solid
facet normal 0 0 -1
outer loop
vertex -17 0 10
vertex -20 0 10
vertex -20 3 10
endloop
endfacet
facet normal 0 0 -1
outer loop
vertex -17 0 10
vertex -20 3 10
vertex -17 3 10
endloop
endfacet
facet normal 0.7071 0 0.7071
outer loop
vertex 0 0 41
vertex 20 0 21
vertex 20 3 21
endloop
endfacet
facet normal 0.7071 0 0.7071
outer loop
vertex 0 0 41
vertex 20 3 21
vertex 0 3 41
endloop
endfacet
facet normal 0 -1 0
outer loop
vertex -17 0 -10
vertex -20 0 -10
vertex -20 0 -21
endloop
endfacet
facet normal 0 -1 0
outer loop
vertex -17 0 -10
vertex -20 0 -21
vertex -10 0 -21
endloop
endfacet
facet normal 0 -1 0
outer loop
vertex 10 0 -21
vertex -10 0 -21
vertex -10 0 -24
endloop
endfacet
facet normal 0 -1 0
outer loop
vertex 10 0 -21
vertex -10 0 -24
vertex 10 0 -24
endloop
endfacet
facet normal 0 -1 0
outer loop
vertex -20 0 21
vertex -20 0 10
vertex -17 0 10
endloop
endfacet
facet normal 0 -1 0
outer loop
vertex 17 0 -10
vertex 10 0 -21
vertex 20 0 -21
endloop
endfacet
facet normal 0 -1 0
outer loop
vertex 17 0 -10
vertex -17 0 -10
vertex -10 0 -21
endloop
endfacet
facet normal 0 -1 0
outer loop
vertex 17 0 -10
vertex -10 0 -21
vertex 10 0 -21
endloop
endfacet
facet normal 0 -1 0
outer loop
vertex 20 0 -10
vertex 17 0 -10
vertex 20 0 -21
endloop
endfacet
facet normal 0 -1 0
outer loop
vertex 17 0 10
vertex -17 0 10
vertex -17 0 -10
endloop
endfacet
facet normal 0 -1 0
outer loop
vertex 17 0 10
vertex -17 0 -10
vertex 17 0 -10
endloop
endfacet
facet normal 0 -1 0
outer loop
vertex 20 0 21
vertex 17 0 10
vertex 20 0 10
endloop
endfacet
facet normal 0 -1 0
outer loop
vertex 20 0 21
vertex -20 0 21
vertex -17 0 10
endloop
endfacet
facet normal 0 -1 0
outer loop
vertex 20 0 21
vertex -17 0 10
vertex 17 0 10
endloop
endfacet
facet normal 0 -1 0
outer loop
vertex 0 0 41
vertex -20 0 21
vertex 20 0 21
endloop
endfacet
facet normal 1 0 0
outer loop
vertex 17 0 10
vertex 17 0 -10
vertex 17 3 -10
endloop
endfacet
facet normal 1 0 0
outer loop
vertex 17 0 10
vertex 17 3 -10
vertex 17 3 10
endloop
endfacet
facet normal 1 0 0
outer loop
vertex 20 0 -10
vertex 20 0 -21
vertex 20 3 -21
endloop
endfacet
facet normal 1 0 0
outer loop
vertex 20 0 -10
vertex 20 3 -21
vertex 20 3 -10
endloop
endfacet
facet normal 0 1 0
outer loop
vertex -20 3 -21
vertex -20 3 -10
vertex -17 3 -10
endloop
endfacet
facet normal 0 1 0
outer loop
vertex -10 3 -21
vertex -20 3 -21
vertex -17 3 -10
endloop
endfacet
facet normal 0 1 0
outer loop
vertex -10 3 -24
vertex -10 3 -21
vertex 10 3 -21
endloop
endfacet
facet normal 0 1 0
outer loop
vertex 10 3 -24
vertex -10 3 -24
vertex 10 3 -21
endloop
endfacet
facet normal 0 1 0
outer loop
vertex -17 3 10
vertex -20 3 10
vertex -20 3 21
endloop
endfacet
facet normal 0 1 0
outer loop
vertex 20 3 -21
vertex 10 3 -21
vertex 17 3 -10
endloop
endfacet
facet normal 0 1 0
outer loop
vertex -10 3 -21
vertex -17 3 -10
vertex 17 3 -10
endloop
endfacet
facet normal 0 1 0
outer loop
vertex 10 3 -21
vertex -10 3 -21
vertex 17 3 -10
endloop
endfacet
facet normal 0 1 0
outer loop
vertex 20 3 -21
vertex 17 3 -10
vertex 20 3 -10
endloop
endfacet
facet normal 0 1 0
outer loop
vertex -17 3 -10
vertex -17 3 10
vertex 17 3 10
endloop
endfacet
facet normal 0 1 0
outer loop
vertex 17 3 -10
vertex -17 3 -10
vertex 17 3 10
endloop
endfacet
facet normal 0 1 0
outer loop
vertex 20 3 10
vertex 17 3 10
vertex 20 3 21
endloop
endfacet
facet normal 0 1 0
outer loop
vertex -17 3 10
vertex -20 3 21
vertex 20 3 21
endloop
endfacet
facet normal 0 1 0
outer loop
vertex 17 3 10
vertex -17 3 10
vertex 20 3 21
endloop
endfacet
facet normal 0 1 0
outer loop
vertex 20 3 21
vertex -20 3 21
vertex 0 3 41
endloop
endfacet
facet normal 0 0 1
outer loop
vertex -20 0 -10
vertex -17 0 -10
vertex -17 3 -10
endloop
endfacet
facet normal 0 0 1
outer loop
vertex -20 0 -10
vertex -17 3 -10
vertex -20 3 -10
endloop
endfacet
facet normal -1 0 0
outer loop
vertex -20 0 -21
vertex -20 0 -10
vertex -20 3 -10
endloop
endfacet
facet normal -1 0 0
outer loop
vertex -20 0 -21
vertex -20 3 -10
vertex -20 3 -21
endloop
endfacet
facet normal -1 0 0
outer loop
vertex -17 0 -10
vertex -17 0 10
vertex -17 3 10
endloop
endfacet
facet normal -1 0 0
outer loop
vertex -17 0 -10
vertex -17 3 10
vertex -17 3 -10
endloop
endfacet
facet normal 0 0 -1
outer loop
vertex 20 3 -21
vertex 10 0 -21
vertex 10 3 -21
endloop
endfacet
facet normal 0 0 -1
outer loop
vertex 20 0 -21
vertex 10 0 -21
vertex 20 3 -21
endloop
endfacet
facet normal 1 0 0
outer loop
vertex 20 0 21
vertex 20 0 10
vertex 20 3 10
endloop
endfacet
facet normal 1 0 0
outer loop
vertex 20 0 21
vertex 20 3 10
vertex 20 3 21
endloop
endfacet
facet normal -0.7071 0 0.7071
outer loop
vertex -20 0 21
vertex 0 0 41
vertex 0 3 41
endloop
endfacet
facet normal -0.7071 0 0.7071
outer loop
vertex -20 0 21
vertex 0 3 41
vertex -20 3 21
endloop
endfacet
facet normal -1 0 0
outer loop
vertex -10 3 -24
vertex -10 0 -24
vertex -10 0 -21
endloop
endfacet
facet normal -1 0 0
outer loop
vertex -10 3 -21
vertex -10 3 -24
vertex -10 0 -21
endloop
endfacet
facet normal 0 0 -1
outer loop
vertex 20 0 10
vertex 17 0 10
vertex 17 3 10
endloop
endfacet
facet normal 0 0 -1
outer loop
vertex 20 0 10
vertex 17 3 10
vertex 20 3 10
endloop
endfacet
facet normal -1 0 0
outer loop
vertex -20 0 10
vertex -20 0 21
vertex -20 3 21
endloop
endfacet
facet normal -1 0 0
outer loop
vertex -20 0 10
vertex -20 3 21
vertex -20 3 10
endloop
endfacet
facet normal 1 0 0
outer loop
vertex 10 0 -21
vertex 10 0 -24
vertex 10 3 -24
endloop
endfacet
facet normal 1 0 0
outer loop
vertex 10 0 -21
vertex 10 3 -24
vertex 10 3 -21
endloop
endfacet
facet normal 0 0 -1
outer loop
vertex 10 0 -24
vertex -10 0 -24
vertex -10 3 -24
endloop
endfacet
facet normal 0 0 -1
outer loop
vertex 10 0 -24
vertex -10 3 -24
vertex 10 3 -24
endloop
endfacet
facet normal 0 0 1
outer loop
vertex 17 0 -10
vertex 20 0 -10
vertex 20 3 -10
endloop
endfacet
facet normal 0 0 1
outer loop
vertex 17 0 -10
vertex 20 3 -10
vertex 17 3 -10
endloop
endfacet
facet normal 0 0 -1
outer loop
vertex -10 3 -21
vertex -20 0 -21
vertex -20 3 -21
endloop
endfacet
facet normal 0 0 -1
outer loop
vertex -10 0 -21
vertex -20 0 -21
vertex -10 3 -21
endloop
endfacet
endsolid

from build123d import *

# Parameters (mm, degrees)
F0_W     = 20
F0_H     = 40
F0_H_2   = 3
F1_DEPTH = 3


# Not quite as in the source:
# - a feature names something its author has since deleted; it is built from what else it names


with BuildPart() as f1:
    # F0 (on Front) → F1 (new body)
    with BuildSketch(Plane.XZ):
        Polygon((10, -21), (20, -21), (20, -10), (17, -10), (17, 10), (20, 10), (20, 21), (0, 41), (-20, 21), (-20, 10), (-17, 10), (-17, -10), (-20, -10), (-20, -21), (-10, -21), (-10, 19), (10, 19), align=None)
        with Locations((0, -1)):
            Rectangle(F0_W, F0_H)
        with Locations((0, -22.5)):
            Rectangle(F0_W, F0_H_2)
    extrude(amount=-F1_DEPTH)


solid = f1.part
